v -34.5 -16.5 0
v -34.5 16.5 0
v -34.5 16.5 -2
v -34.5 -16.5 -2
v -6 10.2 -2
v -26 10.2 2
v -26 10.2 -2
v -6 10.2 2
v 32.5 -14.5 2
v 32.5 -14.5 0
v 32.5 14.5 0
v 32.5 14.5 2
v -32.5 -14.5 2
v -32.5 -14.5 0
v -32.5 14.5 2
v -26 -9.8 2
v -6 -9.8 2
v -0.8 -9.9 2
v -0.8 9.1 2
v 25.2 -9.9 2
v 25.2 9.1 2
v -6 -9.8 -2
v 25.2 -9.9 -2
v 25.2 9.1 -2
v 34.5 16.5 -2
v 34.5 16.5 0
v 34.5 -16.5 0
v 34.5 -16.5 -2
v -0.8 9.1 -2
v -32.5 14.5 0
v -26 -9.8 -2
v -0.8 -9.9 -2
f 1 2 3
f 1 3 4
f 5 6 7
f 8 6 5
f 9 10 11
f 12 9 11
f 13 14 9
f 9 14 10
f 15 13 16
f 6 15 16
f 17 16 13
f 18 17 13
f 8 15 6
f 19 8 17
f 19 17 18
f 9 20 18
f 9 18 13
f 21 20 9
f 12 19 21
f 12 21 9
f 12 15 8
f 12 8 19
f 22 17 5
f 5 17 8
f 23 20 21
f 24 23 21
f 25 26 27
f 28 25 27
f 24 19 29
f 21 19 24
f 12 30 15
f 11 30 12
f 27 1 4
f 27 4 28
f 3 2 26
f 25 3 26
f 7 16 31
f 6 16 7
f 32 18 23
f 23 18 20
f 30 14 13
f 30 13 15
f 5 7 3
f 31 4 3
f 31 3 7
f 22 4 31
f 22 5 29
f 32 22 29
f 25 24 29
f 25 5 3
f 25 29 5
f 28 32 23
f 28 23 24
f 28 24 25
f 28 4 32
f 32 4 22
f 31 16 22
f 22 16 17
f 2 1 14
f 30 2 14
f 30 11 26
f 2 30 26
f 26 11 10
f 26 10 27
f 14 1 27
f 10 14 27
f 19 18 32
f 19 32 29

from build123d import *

# Parameters (mm, degrees)
SKETCH_W      = 65
SKETCH_H      = 29
PAD_DEPTH     = 2
SKETCH002_W   = 69
SKETCH002_H   = 33
PAD001_DEPTH  = 2
SKETCH003_W   = 20
SKETCH003_H   = 20
SKETCH003_W_2 = 26
SKETCH003_H_2 = 19
POCKET_DEPTH  = 4.001


with BuildPart() as part:
    # Sketch → Pad (new body)
    with BuildSketch(Plane.XY):
        Rectangle(SKETCH_W, SKETCH_H)
    extrude(amount=PAD_DEPTH)

    # Sketch002 (on Face5 of Pad) → Pad001 (join)
    with BuildSketch(Plane(origin=(0, 0, 0), x_dir=(1, 0, 0), z_dir=(0, 0, -1))):
        Rectangle(SKETCH002_W, SKETCH002_H)
    extrude(amount=PAD001_DEPTH)

    # Sketch003 (on Face11 of Pad001) → Pocket (cut, through all)
    with BuildSketch(Plane.XY.offset(2)):
        with Locations((-16, 0.2)):
            Rectangle(SKETCH003_W, SKETCH003_H)
        with Locations((12.2, -0.4)):
            Rectangle(SKETCH003_W_2, SKETCH003_H_2)
    extrude(amount=-POCKET_DEPTH, mode=Mode.SUBTRACT)


solid = part.part
